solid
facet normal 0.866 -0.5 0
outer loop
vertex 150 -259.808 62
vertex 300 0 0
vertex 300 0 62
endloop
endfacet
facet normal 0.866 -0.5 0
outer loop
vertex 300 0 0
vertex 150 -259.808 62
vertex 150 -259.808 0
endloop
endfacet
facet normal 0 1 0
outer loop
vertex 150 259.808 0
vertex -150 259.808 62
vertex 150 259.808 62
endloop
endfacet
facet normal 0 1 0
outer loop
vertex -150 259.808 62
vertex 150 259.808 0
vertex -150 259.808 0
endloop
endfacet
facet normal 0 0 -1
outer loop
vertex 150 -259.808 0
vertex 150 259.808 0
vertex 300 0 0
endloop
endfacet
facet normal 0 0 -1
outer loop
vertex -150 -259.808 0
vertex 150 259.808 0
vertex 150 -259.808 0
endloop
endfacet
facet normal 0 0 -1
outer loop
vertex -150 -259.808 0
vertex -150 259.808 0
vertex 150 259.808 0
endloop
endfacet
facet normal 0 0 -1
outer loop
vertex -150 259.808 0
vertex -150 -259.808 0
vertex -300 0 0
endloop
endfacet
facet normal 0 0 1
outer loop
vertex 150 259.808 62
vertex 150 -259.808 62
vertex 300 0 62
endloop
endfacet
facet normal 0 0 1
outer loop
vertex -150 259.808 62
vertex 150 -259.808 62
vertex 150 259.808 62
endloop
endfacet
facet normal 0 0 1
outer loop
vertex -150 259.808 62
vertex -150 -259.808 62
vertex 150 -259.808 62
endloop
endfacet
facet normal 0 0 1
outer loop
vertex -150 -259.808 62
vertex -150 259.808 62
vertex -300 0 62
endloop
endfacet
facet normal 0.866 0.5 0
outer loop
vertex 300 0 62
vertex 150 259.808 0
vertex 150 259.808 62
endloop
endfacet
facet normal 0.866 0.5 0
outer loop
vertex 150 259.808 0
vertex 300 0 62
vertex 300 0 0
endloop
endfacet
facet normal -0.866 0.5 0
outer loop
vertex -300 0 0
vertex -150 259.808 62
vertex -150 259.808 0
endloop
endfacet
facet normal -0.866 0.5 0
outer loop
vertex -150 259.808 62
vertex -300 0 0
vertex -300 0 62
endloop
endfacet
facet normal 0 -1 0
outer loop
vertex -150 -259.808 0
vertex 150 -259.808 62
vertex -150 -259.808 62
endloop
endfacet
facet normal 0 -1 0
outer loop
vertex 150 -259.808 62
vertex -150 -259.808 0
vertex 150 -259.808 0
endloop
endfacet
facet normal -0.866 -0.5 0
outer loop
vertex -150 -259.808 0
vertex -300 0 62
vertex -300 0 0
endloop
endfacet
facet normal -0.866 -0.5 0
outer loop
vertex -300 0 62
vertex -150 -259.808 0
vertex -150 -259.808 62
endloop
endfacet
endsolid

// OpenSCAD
// resolution bezier curve
deltat = 0.004;

// cubic bexier curve function
function cubic_bezier(p0,p1,p2,p3) = [for (t=[0:deltat:1+deltat]) pow(1-t,3)*p0+3*pow((1-t),2)*t*p1+3*(1-t)*pow(t,2)*p2+pow(t,3)*p3];
    
function reverse(v) = [for (i=[len(v)-1:-1:0]) v[i]];
function delete_first(v) = [for (i=[1:len(v)-1]) v[i]]; 

// cubic bezier curve for canal shape 
p10 = [-75, 63];
p11 = [-30, 63];
p12 = [-60, 18];
p13 = [0, 18];

p20 = [75, 63];
p21 = [30, 63];
p22 = [60, 18];
p23 = [0, 18];


// bezier curve
points_left = cubic_bezier(p10, p11, p12, p13);
points_right = reverse(cubic_bezier(p20, p21, p22, p23));
points = concat(points_left, points_right);

difference()
{
    color("Peru", 1.0)
    {
        // hexagon base
        linear_extrude(height = 62, center = false, convexity = 10, twist = 0)
        circle(300, $fn=6);
    }
    
    color("DodgerBlue", 1.0)
    {
        // canal shape
        rotate([90,0,0])
        linear_extrude(height = 1200, center = true, convexity = 10, twist = 0)
        polygon(points);
    }
    
}
